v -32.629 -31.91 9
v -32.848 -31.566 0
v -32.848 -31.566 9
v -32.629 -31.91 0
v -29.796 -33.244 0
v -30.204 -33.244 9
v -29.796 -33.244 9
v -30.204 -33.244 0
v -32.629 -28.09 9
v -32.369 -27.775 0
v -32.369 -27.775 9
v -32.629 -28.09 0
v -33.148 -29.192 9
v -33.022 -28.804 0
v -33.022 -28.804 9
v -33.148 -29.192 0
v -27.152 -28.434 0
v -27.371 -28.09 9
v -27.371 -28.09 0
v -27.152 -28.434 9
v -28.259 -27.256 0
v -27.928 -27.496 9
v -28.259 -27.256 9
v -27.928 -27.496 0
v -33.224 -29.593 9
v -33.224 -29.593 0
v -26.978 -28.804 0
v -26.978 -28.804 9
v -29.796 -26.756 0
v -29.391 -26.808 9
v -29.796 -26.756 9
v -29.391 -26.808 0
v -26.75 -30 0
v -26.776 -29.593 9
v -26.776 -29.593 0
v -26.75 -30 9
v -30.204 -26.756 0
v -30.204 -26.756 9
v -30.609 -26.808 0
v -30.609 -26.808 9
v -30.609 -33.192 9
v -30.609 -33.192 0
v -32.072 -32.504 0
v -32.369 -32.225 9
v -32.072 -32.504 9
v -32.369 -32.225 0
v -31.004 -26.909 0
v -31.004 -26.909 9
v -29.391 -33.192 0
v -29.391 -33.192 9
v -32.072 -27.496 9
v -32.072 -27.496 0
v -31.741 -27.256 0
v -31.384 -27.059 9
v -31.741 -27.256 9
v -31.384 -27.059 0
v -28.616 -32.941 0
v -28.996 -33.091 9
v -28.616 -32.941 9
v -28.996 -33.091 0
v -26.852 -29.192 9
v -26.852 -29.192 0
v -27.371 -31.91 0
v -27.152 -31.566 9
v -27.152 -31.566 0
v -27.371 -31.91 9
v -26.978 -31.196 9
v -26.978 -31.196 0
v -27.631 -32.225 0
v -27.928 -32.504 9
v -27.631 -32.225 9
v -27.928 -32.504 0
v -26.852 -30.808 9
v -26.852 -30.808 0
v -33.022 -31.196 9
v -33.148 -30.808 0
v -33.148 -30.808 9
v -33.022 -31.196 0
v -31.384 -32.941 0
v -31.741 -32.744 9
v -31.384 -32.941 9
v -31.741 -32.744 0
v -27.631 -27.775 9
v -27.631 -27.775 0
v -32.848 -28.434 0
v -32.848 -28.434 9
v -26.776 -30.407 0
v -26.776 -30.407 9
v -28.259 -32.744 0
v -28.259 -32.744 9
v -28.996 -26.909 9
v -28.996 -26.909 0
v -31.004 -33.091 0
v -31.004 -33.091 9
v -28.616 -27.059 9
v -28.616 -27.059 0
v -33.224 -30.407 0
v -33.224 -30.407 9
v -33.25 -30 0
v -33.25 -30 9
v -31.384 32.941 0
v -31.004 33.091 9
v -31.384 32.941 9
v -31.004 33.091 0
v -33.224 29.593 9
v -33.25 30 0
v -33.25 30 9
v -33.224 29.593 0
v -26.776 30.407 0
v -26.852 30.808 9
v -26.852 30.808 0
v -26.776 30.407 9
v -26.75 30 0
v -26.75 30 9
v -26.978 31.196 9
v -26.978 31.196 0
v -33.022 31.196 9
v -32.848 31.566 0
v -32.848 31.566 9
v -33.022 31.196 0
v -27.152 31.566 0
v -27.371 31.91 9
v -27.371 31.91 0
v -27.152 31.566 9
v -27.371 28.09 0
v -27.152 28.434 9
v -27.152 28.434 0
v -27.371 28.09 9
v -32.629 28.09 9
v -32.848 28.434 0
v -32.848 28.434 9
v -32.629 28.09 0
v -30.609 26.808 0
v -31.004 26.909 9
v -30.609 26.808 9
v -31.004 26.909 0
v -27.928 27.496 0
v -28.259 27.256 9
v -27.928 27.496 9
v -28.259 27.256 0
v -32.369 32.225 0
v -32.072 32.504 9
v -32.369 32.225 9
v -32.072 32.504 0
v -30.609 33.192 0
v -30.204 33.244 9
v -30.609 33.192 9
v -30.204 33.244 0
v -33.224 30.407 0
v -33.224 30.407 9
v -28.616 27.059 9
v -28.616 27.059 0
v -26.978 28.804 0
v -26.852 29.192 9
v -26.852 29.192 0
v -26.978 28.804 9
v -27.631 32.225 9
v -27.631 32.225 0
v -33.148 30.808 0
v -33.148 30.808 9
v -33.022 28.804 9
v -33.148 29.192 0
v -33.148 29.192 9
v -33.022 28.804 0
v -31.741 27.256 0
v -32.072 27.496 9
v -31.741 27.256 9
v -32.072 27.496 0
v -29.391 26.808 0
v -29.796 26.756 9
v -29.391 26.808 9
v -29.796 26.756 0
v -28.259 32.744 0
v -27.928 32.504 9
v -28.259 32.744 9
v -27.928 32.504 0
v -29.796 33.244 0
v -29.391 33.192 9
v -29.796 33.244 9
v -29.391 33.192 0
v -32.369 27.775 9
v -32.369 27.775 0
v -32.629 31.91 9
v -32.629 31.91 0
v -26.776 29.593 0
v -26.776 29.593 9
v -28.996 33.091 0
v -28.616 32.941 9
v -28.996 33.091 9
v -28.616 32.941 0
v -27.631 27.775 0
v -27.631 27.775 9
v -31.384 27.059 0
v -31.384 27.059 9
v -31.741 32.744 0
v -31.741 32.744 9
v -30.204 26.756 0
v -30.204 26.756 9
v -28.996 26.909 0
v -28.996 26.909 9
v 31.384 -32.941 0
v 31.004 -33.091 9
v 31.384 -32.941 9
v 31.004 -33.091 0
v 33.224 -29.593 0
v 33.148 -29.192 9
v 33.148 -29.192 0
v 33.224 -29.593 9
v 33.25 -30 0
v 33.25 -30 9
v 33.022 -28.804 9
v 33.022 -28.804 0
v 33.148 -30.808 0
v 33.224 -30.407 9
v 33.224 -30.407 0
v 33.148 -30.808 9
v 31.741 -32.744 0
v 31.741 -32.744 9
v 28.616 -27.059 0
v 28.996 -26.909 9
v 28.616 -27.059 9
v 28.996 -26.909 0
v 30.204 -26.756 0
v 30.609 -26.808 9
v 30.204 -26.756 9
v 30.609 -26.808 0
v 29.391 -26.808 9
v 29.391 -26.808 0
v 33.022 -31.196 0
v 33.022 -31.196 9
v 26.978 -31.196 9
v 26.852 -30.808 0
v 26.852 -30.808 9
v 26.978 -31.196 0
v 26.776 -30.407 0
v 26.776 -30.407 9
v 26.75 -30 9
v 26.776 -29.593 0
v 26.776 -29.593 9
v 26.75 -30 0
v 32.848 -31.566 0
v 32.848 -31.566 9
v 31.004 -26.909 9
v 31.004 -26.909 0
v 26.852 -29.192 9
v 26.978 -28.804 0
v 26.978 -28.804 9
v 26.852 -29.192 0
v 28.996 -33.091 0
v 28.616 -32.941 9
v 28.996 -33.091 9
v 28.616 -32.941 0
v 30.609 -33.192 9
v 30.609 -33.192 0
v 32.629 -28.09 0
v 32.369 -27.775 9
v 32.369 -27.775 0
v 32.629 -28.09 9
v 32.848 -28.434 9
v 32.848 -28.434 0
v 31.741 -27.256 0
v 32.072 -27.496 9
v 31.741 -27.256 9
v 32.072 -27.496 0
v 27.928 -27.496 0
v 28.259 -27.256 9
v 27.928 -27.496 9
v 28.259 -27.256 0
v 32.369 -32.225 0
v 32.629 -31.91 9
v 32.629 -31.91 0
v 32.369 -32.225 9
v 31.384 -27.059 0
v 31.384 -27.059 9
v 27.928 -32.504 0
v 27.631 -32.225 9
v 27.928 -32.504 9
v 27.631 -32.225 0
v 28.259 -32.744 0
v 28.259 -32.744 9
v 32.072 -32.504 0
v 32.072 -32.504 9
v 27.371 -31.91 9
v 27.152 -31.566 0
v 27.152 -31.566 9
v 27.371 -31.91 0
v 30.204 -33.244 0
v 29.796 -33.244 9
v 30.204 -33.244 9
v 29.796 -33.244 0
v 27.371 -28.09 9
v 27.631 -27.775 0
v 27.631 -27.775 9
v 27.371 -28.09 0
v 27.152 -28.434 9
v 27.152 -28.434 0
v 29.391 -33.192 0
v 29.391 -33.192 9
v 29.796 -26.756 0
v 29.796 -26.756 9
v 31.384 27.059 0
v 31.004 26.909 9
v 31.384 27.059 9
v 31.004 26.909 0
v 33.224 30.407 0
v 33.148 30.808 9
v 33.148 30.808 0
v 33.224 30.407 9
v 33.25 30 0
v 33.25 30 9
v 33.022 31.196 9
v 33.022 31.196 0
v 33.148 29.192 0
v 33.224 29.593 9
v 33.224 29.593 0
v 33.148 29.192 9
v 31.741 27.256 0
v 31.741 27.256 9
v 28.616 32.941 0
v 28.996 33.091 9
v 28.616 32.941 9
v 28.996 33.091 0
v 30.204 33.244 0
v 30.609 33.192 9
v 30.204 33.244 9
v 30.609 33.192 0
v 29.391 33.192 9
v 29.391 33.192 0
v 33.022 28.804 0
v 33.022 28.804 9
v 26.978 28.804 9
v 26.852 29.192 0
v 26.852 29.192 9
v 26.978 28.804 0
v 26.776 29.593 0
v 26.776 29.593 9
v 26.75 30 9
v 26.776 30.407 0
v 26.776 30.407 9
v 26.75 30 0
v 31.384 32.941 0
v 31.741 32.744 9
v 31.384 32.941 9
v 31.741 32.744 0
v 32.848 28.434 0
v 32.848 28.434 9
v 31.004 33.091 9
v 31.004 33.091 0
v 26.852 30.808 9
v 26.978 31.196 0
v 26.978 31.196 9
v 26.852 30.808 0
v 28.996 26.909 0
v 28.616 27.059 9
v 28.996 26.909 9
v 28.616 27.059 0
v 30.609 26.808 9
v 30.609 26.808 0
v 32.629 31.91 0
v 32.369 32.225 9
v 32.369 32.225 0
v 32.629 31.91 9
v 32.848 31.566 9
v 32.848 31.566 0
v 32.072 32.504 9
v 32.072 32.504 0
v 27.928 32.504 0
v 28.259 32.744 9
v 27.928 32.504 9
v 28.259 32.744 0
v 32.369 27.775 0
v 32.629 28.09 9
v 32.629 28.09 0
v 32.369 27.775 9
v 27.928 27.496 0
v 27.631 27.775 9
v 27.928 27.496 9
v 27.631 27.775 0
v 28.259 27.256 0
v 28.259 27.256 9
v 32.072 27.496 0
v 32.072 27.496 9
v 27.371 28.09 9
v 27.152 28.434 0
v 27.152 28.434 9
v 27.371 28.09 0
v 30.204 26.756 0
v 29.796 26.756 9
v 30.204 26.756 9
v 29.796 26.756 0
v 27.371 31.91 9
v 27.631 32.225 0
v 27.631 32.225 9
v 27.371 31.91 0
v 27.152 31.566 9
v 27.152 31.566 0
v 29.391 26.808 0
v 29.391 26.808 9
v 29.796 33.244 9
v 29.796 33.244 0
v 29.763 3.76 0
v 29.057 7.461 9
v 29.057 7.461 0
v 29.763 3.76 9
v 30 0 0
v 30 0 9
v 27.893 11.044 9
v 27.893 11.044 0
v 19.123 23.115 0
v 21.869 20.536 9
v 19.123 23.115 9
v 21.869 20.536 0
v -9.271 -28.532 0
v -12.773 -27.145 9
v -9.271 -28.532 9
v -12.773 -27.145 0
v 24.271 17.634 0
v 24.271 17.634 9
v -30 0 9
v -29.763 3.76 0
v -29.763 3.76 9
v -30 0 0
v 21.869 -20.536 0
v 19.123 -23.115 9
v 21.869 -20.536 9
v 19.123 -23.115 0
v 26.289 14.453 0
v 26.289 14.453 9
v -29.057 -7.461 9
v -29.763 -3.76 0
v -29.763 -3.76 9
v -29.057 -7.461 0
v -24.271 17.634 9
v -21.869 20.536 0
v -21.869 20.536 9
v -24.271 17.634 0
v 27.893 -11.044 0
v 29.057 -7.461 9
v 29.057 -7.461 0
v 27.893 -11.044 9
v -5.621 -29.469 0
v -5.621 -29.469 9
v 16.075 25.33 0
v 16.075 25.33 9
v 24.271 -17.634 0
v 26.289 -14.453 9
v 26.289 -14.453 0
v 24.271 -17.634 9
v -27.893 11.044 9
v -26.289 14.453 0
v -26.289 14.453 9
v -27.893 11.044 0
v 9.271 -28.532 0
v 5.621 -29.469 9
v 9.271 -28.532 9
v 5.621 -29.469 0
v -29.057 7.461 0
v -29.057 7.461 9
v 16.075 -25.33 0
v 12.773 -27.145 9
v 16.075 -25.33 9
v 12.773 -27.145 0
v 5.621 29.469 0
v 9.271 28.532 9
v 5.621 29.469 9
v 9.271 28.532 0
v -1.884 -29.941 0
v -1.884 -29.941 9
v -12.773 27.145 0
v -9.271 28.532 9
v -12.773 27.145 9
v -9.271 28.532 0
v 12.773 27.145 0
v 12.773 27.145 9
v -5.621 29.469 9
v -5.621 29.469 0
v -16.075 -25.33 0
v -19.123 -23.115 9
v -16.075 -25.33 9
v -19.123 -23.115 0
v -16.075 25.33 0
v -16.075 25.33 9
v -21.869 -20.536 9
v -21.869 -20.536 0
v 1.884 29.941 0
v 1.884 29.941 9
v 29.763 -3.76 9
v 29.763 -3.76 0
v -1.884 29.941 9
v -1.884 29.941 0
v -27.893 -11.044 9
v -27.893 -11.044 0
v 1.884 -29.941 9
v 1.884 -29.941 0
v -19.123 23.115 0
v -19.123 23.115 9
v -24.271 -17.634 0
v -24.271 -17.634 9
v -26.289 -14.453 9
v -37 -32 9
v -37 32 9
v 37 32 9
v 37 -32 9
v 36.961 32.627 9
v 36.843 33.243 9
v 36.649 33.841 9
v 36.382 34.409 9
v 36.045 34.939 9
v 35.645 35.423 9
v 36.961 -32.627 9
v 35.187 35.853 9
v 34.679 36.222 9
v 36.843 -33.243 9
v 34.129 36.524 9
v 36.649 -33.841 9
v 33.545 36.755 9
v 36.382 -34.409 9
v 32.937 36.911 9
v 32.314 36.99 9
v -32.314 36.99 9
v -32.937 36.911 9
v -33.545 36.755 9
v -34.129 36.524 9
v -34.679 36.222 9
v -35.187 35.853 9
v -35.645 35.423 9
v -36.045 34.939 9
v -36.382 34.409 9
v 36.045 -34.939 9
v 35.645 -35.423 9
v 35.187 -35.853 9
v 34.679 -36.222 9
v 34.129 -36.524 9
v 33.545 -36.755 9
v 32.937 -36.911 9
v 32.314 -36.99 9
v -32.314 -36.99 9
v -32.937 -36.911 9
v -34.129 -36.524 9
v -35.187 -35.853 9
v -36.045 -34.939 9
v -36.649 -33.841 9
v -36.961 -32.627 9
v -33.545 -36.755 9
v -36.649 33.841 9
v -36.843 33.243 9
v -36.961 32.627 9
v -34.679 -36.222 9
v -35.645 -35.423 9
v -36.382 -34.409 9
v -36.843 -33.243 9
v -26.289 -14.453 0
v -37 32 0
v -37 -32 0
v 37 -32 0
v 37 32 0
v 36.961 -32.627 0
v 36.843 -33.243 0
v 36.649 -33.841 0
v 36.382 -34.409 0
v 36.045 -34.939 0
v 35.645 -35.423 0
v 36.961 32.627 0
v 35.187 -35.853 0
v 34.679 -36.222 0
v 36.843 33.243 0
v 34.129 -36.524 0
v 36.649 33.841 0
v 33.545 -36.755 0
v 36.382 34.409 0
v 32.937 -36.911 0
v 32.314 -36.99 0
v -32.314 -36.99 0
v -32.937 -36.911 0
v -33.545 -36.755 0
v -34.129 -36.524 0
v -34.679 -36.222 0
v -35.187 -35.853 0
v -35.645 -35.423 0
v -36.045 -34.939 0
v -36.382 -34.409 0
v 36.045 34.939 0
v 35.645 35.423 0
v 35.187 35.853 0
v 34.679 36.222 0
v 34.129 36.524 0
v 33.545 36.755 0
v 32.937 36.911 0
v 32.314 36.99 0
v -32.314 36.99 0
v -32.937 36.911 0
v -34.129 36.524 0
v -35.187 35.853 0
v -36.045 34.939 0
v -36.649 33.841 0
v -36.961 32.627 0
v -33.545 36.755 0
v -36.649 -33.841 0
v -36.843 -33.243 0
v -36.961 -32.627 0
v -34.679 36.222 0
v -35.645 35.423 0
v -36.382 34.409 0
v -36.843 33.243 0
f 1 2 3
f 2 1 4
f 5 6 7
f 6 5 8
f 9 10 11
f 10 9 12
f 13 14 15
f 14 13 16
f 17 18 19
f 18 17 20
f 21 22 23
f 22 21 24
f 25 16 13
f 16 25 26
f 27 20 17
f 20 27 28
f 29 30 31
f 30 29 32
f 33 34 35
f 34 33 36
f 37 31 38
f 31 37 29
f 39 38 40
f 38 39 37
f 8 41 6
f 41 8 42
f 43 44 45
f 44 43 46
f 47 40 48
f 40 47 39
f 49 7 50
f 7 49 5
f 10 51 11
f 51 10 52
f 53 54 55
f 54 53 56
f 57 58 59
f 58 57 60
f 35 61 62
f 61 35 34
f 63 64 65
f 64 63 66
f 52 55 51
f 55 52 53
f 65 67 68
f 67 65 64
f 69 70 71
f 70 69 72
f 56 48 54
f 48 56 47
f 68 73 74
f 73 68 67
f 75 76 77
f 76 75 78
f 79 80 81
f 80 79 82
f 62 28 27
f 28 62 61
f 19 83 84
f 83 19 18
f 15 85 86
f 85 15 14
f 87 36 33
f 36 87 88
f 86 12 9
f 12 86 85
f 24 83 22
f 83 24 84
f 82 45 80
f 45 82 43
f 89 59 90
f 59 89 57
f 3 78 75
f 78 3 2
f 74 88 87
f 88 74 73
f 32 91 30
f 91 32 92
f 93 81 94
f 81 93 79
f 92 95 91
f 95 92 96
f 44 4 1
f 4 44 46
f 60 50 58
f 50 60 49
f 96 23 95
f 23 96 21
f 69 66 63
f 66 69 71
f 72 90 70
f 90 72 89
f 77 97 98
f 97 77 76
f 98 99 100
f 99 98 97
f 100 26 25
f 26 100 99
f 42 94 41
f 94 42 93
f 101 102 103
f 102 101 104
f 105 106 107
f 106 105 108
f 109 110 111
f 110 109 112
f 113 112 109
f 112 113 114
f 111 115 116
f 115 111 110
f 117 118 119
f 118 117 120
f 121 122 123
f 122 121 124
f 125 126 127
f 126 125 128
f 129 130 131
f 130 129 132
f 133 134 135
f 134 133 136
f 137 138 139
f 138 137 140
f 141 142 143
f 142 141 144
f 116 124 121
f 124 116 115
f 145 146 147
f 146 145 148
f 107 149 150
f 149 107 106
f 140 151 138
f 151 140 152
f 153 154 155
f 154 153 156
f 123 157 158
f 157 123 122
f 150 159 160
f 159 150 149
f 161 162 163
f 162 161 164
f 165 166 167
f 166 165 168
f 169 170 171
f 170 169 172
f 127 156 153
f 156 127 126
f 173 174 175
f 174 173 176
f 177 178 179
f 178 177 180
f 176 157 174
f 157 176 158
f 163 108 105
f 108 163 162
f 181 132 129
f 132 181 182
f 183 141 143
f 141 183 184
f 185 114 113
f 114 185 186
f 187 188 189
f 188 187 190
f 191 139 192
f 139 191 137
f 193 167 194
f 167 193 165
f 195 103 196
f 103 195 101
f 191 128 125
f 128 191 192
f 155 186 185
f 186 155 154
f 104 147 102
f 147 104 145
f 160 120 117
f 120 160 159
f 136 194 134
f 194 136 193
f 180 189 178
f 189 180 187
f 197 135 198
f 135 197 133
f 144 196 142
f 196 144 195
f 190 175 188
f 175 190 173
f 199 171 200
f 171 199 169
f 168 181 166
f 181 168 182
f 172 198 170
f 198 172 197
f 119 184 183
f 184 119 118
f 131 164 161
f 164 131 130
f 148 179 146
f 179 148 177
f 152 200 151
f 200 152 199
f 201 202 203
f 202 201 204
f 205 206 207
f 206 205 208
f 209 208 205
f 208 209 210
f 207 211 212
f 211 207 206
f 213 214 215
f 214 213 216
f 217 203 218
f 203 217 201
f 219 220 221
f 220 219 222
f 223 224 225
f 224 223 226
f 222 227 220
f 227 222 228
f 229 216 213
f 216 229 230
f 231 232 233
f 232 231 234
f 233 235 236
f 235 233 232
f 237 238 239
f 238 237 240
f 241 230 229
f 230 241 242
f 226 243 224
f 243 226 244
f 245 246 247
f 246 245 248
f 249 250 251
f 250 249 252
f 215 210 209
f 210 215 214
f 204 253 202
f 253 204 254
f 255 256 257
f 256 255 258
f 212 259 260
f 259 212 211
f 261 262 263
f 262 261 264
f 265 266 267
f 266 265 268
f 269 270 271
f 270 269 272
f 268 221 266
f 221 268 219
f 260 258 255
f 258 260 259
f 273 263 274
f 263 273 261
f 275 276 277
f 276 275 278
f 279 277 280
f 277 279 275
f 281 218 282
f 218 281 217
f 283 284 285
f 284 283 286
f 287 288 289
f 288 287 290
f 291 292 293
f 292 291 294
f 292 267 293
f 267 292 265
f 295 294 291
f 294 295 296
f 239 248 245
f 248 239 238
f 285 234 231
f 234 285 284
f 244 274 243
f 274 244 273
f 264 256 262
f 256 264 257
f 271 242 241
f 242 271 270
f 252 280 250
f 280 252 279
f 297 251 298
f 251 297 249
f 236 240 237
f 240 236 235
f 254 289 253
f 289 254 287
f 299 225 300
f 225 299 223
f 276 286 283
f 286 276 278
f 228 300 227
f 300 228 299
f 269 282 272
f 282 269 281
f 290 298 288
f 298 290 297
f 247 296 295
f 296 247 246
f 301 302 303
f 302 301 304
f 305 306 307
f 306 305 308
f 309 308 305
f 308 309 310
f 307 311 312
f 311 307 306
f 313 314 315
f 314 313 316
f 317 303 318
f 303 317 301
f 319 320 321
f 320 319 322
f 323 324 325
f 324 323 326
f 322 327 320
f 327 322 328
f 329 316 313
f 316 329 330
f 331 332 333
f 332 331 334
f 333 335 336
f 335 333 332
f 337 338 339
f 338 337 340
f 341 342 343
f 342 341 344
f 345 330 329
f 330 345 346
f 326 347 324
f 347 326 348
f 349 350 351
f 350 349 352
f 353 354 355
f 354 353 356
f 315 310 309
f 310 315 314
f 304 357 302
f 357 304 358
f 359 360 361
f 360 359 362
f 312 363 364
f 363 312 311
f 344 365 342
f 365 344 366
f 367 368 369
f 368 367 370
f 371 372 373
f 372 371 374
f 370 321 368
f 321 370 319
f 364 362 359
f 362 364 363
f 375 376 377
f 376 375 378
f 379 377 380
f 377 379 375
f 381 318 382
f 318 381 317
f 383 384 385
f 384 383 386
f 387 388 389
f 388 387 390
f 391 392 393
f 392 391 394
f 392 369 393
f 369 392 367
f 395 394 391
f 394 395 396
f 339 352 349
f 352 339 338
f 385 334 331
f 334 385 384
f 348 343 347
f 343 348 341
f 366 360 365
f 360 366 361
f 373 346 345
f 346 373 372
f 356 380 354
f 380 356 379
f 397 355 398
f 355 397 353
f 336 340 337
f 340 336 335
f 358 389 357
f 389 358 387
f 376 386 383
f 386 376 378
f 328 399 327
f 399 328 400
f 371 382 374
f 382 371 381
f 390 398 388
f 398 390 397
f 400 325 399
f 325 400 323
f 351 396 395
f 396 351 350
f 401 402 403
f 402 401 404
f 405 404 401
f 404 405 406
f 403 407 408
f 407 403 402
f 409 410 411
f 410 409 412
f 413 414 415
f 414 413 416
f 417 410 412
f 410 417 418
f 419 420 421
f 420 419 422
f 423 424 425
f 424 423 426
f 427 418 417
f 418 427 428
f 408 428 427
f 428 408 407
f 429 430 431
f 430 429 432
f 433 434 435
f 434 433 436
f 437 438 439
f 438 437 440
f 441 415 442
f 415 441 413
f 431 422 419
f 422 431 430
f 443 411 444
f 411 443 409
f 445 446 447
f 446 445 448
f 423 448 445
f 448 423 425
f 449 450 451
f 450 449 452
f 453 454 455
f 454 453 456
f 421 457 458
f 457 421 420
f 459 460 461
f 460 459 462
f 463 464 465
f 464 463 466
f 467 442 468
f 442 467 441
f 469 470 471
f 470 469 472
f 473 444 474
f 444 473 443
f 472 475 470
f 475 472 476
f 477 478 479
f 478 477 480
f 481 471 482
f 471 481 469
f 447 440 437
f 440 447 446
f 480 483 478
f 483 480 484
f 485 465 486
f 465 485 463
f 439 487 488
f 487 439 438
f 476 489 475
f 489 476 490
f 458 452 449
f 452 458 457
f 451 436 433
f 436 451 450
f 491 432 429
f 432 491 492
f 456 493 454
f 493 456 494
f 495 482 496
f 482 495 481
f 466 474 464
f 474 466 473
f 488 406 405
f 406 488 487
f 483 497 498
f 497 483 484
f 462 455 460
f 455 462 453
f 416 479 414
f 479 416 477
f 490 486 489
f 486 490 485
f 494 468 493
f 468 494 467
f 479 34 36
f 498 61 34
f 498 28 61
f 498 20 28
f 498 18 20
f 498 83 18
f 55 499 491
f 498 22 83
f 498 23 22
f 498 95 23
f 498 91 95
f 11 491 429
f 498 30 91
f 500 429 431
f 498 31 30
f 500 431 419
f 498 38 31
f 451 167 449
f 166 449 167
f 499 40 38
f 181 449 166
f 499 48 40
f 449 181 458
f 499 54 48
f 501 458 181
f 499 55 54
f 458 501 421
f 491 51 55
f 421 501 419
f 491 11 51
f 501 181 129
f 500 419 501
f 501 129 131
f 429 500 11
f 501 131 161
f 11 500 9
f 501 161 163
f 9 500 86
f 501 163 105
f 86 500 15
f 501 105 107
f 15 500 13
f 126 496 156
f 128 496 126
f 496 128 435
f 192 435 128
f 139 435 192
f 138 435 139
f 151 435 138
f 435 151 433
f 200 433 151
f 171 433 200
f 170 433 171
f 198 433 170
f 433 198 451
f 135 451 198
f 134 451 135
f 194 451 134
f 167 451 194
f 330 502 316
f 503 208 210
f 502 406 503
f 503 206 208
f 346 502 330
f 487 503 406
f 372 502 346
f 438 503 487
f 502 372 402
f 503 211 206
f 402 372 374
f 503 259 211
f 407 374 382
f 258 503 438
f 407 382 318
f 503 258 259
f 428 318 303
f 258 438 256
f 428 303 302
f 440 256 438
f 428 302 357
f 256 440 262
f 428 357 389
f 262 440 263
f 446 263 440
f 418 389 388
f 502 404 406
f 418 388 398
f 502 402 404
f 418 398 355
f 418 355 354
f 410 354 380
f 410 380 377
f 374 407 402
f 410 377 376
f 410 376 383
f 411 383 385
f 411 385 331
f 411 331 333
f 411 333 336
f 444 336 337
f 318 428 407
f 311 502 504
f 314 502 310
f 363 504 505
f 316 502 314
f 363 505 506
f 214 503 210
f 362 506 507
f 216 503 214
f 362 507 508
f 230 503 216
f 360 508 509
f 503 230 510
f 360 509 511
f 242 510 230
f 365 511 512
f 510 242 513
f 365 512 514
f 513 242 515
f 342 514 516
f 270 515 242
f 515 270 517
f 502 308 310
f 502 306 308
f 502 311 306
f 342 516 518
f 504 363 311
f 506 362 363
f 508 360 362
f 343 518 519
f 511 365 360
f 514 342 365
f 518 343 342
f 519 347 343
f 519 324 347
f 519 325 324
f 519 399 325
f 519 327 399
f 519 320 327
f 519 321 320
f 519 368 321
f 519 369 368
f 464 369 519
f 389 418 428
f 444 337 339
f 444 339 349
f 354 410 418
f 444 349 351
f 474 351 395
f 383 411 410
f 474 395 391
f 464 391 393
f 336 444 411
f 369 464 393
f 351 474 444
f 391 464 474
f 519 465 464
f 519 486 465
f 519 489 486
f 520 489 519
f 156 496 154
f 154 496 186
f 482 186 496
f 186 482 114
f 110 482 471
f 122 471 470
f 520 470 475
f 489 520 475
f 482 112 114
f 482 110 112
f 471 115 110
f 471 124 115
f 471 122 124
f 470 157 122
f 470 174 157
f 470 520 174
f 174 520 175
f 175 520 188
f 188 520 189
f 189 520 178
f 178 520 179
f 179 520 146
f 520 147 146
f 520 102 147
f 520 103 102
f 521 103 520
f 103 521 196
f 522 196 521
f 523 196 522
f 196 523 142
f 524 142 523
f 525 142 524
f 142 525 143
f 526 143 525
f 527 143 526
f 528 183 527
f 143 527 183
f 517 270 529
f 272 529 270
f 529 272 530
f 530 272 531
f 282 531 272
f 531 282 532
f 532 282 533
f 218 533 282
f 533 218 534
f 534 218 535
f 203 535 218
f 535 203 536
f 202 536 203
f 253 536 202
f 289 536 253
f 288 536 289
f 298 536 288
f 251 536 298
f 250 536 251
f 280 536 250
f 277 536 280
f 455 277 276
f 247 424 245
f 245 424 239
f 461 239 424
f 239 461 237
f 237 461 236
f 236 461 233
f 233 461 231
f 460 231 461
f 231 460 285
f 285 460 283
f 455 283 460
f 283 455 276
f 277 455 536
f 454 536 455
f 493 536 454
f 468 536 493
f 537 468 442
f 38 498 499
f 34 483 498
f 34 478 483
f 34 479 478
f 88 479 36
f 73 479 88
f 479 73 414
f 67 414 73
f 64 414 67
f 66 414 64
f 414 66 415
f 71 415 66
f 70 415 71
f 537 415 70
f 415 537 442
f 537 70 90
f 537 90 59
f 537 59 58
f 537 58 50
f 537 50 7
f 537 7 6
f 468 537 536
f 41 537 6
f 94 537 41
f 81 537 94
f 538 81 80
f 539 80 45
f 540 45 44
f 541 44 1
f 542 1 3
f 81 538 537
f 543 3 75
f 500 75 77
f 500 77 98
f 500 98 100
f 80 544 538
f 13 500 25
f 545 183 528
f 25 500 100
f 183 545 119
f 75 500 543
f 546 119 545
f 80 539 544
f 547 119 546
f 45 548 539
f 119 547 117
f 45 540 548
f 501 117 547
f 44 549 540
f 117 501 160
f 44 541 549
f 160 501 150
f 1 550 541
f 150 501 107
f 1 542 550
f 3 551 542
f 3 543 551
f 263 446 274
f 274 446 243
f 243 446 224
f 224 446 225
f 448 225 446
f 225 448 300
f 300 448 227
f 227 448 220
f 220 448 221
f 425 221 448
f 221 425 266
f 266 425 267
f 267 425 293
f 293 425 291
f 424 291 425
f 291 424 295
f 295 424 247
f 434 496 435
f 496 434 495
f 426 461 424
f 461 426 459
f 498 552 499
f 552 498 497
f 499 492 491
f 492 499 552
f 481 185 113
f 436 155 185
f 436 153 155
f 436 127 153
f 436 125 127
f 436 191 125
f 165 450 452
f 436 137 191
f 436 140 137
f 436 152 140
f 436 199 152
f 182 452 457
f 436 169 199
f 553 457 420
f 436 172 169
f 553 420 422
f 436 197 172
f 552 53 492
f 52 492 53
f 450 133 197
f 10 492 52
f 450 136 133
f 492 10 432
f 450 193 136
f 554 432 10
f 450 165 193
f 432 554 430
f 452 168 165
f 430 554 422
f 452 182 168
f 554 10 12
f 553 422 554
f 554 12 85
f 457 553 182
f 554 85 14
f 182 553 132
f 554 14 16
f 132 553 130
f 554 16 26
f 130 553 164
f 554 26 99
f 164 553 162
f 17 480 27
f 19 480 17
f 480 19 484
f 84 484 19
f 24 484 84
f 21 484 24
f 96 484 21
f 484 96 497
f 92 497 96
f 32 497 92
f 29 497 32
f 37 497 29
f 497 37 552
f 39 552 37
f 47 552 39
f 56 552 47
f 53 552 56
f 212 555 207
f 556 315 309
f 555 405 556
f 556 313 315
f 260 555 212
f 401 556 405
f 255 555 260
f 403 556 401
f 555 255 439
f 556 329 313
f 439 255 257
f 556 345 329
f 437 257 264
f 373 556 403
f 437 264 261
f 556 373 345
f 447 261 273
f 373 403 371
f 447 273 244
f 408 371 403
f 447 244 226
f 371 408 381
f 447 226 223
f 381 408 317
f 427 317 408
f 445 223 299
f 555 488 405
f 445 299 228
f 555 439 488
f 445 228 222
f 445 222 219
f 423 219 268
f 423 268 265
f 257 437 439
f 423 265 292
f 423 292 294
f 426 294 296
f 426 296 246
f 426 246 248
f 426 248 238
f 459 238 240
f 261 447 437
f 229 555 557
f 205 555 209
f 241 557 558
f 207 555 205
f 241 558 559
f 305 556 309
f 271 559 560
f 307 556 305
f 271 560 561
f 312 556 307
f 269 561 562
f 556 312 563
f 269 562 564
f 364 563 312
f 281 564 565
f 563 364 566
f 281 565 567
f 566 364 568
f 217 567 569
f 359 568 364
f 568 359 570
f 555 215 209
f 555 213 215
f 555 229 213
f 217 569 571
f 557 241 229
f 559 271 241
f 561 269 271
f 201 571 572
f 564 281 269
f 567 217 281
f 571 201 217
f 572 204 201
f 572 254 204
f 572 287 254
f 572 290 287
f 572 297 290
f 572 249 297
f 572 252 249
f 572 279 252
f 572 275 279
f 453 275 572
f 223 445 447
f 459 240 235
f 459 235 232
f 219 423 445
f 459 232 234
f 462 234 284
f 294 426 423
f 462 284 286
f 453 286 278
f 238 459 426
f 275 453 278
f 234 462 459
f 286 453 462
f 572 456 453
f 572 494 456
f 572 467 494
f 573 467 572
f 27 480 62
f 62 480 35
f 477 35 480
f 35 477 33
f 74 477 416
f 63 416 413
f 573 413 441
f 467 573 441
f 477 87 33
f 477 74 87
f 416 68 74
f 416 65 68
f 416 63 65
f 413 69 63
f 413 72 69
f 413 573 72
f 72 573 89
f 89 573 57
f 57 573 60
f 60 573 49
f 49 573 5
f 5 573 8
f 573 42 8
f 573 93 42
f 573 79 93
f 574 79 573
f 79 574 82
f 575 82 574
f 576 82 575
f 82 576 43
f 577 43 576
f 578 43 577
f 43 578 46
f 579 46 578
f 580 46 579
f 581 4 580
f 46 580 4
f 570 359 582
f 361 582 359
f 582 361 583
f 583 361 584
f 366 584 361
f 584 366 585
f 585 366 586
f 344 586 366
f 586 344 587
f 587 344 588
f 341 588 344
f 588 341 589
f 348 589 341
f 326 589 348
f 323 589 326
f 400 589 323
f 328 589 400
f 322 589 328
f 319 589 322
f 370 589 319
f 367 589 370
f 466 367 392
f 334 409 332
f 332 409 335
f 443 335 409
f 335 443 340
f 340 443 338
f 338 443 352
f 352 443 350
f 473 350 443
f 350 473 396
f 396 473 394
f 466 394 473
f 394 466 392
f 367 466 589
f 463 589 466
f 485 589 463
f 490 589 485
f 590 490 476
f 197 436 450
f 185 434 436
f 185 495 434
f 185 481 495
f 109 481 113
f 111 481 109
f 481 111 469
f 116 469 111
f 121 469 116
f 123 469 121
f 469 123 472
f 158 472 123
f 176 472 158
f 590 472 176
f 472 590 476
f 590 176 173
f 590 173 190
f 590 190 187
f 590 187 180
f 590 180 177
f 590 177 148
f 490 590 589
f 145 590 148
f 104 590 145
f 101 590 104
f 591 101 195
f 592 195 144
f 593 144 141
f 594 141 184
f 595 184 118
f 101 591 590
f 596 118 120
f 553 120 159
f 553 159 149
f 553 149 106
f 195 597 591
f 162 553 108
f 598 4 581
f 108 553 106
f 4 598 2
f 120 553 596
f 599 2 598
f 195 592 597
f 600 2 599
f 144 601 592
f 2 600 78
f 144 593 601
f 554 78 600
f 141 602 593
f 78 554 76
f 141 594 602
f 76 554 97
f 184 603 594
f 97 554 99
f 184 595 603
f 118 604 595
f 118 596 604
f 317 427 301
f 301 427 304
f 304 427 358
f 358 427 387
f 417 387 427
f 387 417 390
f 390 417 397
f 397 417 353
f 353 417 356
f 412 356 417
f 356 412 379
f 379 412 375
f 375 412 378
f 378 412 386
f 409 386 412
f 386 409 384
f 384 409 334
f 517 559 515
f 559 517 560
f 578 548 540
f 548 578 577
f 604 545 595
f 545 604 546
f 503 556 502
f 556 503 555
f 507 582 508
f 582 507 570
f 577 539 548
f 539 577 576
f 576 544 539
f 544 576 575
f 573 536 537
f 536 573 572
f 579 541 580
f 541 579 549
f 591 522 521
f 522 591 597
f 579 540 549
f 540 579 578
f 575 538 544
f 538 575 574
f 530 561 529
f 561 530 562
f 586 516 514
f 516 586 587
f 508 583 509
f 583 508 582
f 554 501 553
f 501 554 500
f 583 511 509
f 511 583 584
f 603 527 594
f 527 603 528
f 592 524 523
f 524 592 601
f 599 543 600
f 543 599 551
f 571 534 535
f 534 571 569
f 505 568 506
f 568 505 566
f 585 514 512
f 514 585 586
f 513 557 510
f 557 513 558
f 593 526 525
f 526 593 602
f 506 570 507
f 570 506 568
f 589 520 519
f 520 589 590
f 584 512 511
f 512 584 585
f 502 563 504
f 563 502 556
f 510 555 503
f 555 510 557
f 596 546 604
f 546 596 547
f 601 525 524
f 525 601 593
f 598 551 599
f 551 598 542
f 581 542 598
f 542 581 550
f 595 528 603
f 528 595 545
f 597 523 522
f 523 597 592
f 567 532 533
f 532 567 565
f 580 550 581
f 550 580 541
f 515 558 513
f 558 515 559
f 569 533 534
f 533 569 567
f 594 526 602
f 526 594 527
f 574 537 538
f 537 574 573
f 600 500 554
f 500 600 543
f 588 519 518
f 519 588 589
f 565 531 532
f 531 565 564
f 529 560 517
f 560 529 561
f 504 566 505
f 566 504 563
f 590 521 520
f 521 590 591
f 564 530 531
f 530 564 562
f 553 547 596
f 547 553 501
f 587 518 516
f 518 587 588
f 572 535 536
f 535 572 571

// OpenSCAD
$fn = 50;


difference() {
	union() {
		hull() {
			translate(v = [-32.0000000000, 32.0000000000, 0]) {
				cylinder(h = 9, r = 5);
			}
			translate(v = [32.0000000000, 32.0000000000, 0]) {
				cylinder(h = 9, r = 5);
			}
			translate(v = [-32.0000000000, -32.0000000000, 0]) {
				cylinder(h = 9, r = 5);
			}
			translate(v = [32.0000000000, -32.0000000000, 0]) {
				cylinder(h = 9, r = 5);
			}
		}
	}
	union() {
		#translate(v = [-30.0000000000, -30.0000000000, -100.0000000000]) {
			cylinder(h = 200, r = 3.2500000000);
		}
		#translate(v = [-30.0000000000, 30.0000000000, -100.0000000000]) {
			cylinder(h = 200, r = 3.2500000000);
		}
		#translate(v = [30.0000000000, -30.0000000000, -100.0000000000]) {
			cylinder(h = 200, r = 3.2500000000);
		}
		#translate(v = [30.0000000000, 30.0000000000, -100.0000000000]) {
			cylinder(h = 200, r = 3.2500000000);
		}
		#cylinder(h = 9, r = 30.0000000000);
	}
}
